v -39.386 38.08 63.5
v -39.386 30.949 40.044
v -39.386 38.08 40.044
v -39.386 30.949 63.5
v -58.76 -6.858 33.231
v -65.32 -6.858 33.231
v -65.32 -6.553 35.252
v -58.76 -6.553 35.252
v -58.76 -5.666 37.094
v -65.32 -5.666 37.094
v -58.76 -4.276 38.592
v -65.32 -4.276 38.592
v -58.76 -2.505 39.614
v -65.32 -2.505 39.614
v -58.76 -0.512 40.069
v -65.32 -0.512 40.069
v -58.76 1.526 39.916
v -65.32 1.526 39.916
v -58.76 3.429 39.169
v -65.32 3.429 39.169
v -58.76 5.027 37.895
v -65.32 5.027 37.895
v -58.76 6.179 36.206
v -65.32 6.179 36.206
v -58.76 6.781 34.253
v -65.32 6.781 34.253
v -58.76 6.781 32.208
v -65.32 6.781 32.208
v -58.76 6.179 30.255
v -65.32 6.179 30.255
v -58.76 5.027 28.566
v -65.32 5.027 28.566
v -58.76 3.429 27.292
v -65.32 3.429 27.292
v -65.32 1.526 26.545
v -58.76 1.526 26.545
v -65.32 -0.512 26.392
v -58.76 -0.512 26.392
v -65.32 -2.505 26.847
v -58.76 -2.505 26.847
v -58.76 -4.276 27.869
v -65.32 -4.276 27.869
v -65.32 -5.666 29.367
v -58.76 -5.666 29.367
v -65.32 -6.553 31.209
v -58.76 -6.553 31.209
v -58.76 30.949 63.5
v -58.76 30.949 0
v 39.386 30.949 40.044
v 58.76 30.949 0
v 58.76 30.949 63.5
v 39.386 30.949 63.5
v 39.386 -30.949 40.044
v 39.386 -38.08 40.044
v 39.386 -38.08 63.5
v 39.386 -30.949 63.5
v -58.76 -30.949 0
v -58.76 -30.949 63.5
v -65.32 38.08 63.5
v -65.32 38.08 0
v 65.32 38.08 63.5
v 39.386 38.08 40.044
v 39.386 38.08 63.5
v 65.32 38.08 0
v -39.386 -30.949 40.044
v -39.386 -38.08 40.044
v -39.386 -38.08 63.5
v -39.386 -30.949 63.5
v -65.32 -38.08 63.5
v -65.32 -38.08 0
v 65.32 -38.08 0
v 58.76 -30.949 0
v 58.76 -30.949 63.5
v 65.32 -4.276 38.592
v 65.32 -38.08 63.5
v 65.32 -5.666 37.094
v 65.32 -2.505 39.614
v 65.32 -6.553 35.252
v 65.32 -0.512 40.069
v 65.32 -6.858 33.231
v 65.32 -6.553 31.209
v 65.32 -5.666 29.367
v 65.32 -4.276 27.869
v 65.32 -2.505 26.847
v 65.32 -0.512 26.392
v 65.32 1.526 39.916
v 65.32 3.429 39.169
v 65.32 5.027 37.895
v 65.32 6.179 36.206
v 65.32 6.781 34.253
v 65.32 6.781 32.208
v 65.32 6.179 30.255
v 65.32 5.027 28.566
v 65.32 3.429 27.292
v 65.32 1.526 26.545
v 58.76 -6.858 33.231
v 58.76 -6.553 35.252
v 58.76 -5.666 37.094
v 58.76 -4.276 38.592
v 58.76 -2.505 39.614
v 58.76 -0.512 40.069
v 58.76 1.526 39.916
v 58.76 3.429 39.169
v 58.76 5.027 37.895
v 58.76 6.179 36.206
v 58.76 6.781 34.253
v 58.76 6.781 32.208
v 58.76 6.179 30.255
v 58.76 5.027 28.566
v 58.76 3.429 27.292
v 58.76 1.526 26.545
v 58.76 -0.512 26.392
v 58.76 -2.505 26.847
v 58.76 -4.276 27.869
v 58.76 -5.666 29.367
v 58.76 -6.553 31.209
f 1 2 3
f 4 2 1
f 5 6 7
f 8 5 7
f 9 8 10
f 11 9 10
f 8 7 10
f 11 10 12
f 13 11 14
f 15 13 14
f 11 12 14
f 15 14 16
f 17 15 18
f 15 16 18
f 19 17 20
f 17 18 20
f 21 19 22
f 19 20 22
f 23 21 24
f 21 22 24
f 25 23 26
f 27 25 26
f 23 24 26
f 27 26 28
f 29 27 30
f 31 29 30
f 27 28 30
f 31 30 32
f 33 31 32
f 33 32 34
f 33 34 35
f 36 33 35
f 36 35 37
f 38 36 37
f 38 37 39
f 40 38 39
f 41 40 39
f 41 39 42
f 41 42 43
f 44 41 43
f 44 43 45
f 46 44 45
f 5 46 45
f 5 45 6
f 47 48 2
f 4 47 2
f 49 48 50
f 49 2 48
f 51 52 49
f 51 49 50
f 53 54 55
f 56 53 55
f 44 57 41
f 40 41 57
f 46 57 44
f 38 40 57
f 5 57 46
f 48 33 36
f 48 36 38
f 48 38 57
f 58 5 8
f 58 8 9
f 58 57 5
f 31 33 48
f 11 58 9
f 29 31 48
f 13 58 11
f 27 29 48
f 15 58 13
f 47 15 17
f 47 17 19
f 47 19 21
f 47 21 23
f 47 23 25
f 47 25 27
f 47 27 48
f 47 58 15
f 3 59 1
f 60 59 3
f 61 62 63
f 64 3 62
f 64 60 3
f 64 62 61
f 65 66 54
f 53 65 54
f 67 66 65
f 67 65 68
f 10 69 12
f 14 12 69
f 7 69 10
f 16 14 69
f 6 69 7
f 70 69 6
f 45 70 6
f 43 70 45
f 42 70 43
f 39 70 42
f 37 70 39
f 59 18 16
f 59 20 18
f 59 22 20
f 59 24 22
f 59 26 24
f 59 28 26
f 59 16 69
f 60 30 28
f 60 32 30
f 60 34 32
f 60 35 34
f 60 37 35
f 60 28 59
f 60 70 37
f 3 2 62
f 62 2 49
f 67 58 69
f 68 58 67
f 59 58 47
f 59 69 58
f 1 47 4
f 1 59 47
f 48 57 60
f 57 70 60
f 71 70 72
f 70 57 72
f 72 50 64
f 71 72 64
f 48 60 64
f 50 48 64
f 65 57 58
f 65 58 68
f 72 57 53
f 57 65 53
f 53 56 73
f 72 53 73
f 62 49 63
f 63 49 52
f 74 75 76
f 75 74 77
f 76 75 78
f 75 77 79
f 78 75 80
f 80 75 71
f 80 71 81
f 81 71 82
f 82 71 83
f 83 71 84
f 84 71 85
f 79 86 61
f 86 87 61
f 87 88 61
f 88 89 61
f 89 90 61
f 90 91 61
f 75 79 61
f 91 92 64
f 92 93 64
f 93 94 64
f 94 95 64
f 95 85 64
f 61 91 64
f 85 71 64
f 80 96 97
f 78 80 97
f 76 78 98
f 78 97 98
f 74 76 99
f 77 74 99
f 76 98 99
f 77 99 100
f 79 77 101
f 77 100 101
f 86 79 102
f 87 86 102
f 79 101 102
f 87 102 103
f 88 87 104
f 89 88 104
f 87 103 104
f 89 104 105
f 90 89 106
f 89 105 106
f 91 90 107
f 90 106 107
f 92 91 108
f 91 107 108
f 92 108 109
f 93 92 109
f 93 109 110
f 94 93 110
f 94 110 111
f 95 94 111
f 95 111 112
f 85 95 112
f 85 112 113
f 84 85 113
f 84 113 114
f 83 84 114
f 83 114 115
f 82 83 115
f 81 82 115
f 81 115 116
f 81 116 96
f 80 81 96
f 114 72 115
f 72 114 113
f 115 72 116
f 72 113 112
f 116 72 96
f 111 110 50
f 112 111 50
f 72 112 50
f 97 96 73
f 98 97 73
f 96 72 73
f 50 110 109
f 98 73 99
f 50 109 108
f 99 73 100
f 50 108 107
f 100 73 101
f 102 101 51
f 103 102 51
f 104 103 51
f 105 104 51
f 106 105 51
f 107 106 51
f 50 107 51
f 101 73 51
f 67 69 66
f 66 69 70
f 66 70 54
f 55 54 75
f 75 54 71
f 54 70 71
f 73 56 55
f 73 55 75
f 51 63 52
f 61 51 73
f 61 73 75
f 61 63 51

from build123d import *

# Parameters (mm, degrees)
F0_W     = 130.6402087212
F0_H     = 76.1592537165
F1_DEPTH = 63.5
F2_W     = 117.5191476941
F2_H     = 61.8972182274
F3_DEPTH = 63.5
F4_W     = 78.7710472941
F4_H     = 23.4558616281
F5_DEPTH = 101.6
F6_R     = 6.8576505009
F7_DEPTH = 152.4


with BuildPart() as f1:
    # F0 (on Top) → F1 (new body)
    with BuildSketch(Plane.XY):
        Rectangle(F0_W, F0_H)
    extrude(amount=F1_DEPTH)

    # F2 (on face) → F3 (cut)
    with BuildSketch(Plane.XY.offset(63.5)):
        Rectangle(F2_W, F2_H)
    extrude(amount=-F3_DEPTH, mode=Mode.SUBTRACT)

    # F4 (on face) → F5 (cut)
    with BuildSketch(Plane.XZ.offset(38.0796268582)):
        with Locations((0, 51.772069186)):
            Rectangle(F4_W, F4_H)
    extrude(amount=-F5_DEPTH, mode=Mode.SUBTRACT)

    # F6 (on face) → F7 (cut)
    with BuildSketch(Plane(origin=(-65.3201043606, 0, 0), x_dir=(0, -1, 0), z_dir=(-1, 0, 0))):
        with Locations((0, 33.230535686)):
            Circle(F6_R)
    extrude(amount=-F7_DEPTH, mode=Mode.SUBTRACT)


solid = f1.part
